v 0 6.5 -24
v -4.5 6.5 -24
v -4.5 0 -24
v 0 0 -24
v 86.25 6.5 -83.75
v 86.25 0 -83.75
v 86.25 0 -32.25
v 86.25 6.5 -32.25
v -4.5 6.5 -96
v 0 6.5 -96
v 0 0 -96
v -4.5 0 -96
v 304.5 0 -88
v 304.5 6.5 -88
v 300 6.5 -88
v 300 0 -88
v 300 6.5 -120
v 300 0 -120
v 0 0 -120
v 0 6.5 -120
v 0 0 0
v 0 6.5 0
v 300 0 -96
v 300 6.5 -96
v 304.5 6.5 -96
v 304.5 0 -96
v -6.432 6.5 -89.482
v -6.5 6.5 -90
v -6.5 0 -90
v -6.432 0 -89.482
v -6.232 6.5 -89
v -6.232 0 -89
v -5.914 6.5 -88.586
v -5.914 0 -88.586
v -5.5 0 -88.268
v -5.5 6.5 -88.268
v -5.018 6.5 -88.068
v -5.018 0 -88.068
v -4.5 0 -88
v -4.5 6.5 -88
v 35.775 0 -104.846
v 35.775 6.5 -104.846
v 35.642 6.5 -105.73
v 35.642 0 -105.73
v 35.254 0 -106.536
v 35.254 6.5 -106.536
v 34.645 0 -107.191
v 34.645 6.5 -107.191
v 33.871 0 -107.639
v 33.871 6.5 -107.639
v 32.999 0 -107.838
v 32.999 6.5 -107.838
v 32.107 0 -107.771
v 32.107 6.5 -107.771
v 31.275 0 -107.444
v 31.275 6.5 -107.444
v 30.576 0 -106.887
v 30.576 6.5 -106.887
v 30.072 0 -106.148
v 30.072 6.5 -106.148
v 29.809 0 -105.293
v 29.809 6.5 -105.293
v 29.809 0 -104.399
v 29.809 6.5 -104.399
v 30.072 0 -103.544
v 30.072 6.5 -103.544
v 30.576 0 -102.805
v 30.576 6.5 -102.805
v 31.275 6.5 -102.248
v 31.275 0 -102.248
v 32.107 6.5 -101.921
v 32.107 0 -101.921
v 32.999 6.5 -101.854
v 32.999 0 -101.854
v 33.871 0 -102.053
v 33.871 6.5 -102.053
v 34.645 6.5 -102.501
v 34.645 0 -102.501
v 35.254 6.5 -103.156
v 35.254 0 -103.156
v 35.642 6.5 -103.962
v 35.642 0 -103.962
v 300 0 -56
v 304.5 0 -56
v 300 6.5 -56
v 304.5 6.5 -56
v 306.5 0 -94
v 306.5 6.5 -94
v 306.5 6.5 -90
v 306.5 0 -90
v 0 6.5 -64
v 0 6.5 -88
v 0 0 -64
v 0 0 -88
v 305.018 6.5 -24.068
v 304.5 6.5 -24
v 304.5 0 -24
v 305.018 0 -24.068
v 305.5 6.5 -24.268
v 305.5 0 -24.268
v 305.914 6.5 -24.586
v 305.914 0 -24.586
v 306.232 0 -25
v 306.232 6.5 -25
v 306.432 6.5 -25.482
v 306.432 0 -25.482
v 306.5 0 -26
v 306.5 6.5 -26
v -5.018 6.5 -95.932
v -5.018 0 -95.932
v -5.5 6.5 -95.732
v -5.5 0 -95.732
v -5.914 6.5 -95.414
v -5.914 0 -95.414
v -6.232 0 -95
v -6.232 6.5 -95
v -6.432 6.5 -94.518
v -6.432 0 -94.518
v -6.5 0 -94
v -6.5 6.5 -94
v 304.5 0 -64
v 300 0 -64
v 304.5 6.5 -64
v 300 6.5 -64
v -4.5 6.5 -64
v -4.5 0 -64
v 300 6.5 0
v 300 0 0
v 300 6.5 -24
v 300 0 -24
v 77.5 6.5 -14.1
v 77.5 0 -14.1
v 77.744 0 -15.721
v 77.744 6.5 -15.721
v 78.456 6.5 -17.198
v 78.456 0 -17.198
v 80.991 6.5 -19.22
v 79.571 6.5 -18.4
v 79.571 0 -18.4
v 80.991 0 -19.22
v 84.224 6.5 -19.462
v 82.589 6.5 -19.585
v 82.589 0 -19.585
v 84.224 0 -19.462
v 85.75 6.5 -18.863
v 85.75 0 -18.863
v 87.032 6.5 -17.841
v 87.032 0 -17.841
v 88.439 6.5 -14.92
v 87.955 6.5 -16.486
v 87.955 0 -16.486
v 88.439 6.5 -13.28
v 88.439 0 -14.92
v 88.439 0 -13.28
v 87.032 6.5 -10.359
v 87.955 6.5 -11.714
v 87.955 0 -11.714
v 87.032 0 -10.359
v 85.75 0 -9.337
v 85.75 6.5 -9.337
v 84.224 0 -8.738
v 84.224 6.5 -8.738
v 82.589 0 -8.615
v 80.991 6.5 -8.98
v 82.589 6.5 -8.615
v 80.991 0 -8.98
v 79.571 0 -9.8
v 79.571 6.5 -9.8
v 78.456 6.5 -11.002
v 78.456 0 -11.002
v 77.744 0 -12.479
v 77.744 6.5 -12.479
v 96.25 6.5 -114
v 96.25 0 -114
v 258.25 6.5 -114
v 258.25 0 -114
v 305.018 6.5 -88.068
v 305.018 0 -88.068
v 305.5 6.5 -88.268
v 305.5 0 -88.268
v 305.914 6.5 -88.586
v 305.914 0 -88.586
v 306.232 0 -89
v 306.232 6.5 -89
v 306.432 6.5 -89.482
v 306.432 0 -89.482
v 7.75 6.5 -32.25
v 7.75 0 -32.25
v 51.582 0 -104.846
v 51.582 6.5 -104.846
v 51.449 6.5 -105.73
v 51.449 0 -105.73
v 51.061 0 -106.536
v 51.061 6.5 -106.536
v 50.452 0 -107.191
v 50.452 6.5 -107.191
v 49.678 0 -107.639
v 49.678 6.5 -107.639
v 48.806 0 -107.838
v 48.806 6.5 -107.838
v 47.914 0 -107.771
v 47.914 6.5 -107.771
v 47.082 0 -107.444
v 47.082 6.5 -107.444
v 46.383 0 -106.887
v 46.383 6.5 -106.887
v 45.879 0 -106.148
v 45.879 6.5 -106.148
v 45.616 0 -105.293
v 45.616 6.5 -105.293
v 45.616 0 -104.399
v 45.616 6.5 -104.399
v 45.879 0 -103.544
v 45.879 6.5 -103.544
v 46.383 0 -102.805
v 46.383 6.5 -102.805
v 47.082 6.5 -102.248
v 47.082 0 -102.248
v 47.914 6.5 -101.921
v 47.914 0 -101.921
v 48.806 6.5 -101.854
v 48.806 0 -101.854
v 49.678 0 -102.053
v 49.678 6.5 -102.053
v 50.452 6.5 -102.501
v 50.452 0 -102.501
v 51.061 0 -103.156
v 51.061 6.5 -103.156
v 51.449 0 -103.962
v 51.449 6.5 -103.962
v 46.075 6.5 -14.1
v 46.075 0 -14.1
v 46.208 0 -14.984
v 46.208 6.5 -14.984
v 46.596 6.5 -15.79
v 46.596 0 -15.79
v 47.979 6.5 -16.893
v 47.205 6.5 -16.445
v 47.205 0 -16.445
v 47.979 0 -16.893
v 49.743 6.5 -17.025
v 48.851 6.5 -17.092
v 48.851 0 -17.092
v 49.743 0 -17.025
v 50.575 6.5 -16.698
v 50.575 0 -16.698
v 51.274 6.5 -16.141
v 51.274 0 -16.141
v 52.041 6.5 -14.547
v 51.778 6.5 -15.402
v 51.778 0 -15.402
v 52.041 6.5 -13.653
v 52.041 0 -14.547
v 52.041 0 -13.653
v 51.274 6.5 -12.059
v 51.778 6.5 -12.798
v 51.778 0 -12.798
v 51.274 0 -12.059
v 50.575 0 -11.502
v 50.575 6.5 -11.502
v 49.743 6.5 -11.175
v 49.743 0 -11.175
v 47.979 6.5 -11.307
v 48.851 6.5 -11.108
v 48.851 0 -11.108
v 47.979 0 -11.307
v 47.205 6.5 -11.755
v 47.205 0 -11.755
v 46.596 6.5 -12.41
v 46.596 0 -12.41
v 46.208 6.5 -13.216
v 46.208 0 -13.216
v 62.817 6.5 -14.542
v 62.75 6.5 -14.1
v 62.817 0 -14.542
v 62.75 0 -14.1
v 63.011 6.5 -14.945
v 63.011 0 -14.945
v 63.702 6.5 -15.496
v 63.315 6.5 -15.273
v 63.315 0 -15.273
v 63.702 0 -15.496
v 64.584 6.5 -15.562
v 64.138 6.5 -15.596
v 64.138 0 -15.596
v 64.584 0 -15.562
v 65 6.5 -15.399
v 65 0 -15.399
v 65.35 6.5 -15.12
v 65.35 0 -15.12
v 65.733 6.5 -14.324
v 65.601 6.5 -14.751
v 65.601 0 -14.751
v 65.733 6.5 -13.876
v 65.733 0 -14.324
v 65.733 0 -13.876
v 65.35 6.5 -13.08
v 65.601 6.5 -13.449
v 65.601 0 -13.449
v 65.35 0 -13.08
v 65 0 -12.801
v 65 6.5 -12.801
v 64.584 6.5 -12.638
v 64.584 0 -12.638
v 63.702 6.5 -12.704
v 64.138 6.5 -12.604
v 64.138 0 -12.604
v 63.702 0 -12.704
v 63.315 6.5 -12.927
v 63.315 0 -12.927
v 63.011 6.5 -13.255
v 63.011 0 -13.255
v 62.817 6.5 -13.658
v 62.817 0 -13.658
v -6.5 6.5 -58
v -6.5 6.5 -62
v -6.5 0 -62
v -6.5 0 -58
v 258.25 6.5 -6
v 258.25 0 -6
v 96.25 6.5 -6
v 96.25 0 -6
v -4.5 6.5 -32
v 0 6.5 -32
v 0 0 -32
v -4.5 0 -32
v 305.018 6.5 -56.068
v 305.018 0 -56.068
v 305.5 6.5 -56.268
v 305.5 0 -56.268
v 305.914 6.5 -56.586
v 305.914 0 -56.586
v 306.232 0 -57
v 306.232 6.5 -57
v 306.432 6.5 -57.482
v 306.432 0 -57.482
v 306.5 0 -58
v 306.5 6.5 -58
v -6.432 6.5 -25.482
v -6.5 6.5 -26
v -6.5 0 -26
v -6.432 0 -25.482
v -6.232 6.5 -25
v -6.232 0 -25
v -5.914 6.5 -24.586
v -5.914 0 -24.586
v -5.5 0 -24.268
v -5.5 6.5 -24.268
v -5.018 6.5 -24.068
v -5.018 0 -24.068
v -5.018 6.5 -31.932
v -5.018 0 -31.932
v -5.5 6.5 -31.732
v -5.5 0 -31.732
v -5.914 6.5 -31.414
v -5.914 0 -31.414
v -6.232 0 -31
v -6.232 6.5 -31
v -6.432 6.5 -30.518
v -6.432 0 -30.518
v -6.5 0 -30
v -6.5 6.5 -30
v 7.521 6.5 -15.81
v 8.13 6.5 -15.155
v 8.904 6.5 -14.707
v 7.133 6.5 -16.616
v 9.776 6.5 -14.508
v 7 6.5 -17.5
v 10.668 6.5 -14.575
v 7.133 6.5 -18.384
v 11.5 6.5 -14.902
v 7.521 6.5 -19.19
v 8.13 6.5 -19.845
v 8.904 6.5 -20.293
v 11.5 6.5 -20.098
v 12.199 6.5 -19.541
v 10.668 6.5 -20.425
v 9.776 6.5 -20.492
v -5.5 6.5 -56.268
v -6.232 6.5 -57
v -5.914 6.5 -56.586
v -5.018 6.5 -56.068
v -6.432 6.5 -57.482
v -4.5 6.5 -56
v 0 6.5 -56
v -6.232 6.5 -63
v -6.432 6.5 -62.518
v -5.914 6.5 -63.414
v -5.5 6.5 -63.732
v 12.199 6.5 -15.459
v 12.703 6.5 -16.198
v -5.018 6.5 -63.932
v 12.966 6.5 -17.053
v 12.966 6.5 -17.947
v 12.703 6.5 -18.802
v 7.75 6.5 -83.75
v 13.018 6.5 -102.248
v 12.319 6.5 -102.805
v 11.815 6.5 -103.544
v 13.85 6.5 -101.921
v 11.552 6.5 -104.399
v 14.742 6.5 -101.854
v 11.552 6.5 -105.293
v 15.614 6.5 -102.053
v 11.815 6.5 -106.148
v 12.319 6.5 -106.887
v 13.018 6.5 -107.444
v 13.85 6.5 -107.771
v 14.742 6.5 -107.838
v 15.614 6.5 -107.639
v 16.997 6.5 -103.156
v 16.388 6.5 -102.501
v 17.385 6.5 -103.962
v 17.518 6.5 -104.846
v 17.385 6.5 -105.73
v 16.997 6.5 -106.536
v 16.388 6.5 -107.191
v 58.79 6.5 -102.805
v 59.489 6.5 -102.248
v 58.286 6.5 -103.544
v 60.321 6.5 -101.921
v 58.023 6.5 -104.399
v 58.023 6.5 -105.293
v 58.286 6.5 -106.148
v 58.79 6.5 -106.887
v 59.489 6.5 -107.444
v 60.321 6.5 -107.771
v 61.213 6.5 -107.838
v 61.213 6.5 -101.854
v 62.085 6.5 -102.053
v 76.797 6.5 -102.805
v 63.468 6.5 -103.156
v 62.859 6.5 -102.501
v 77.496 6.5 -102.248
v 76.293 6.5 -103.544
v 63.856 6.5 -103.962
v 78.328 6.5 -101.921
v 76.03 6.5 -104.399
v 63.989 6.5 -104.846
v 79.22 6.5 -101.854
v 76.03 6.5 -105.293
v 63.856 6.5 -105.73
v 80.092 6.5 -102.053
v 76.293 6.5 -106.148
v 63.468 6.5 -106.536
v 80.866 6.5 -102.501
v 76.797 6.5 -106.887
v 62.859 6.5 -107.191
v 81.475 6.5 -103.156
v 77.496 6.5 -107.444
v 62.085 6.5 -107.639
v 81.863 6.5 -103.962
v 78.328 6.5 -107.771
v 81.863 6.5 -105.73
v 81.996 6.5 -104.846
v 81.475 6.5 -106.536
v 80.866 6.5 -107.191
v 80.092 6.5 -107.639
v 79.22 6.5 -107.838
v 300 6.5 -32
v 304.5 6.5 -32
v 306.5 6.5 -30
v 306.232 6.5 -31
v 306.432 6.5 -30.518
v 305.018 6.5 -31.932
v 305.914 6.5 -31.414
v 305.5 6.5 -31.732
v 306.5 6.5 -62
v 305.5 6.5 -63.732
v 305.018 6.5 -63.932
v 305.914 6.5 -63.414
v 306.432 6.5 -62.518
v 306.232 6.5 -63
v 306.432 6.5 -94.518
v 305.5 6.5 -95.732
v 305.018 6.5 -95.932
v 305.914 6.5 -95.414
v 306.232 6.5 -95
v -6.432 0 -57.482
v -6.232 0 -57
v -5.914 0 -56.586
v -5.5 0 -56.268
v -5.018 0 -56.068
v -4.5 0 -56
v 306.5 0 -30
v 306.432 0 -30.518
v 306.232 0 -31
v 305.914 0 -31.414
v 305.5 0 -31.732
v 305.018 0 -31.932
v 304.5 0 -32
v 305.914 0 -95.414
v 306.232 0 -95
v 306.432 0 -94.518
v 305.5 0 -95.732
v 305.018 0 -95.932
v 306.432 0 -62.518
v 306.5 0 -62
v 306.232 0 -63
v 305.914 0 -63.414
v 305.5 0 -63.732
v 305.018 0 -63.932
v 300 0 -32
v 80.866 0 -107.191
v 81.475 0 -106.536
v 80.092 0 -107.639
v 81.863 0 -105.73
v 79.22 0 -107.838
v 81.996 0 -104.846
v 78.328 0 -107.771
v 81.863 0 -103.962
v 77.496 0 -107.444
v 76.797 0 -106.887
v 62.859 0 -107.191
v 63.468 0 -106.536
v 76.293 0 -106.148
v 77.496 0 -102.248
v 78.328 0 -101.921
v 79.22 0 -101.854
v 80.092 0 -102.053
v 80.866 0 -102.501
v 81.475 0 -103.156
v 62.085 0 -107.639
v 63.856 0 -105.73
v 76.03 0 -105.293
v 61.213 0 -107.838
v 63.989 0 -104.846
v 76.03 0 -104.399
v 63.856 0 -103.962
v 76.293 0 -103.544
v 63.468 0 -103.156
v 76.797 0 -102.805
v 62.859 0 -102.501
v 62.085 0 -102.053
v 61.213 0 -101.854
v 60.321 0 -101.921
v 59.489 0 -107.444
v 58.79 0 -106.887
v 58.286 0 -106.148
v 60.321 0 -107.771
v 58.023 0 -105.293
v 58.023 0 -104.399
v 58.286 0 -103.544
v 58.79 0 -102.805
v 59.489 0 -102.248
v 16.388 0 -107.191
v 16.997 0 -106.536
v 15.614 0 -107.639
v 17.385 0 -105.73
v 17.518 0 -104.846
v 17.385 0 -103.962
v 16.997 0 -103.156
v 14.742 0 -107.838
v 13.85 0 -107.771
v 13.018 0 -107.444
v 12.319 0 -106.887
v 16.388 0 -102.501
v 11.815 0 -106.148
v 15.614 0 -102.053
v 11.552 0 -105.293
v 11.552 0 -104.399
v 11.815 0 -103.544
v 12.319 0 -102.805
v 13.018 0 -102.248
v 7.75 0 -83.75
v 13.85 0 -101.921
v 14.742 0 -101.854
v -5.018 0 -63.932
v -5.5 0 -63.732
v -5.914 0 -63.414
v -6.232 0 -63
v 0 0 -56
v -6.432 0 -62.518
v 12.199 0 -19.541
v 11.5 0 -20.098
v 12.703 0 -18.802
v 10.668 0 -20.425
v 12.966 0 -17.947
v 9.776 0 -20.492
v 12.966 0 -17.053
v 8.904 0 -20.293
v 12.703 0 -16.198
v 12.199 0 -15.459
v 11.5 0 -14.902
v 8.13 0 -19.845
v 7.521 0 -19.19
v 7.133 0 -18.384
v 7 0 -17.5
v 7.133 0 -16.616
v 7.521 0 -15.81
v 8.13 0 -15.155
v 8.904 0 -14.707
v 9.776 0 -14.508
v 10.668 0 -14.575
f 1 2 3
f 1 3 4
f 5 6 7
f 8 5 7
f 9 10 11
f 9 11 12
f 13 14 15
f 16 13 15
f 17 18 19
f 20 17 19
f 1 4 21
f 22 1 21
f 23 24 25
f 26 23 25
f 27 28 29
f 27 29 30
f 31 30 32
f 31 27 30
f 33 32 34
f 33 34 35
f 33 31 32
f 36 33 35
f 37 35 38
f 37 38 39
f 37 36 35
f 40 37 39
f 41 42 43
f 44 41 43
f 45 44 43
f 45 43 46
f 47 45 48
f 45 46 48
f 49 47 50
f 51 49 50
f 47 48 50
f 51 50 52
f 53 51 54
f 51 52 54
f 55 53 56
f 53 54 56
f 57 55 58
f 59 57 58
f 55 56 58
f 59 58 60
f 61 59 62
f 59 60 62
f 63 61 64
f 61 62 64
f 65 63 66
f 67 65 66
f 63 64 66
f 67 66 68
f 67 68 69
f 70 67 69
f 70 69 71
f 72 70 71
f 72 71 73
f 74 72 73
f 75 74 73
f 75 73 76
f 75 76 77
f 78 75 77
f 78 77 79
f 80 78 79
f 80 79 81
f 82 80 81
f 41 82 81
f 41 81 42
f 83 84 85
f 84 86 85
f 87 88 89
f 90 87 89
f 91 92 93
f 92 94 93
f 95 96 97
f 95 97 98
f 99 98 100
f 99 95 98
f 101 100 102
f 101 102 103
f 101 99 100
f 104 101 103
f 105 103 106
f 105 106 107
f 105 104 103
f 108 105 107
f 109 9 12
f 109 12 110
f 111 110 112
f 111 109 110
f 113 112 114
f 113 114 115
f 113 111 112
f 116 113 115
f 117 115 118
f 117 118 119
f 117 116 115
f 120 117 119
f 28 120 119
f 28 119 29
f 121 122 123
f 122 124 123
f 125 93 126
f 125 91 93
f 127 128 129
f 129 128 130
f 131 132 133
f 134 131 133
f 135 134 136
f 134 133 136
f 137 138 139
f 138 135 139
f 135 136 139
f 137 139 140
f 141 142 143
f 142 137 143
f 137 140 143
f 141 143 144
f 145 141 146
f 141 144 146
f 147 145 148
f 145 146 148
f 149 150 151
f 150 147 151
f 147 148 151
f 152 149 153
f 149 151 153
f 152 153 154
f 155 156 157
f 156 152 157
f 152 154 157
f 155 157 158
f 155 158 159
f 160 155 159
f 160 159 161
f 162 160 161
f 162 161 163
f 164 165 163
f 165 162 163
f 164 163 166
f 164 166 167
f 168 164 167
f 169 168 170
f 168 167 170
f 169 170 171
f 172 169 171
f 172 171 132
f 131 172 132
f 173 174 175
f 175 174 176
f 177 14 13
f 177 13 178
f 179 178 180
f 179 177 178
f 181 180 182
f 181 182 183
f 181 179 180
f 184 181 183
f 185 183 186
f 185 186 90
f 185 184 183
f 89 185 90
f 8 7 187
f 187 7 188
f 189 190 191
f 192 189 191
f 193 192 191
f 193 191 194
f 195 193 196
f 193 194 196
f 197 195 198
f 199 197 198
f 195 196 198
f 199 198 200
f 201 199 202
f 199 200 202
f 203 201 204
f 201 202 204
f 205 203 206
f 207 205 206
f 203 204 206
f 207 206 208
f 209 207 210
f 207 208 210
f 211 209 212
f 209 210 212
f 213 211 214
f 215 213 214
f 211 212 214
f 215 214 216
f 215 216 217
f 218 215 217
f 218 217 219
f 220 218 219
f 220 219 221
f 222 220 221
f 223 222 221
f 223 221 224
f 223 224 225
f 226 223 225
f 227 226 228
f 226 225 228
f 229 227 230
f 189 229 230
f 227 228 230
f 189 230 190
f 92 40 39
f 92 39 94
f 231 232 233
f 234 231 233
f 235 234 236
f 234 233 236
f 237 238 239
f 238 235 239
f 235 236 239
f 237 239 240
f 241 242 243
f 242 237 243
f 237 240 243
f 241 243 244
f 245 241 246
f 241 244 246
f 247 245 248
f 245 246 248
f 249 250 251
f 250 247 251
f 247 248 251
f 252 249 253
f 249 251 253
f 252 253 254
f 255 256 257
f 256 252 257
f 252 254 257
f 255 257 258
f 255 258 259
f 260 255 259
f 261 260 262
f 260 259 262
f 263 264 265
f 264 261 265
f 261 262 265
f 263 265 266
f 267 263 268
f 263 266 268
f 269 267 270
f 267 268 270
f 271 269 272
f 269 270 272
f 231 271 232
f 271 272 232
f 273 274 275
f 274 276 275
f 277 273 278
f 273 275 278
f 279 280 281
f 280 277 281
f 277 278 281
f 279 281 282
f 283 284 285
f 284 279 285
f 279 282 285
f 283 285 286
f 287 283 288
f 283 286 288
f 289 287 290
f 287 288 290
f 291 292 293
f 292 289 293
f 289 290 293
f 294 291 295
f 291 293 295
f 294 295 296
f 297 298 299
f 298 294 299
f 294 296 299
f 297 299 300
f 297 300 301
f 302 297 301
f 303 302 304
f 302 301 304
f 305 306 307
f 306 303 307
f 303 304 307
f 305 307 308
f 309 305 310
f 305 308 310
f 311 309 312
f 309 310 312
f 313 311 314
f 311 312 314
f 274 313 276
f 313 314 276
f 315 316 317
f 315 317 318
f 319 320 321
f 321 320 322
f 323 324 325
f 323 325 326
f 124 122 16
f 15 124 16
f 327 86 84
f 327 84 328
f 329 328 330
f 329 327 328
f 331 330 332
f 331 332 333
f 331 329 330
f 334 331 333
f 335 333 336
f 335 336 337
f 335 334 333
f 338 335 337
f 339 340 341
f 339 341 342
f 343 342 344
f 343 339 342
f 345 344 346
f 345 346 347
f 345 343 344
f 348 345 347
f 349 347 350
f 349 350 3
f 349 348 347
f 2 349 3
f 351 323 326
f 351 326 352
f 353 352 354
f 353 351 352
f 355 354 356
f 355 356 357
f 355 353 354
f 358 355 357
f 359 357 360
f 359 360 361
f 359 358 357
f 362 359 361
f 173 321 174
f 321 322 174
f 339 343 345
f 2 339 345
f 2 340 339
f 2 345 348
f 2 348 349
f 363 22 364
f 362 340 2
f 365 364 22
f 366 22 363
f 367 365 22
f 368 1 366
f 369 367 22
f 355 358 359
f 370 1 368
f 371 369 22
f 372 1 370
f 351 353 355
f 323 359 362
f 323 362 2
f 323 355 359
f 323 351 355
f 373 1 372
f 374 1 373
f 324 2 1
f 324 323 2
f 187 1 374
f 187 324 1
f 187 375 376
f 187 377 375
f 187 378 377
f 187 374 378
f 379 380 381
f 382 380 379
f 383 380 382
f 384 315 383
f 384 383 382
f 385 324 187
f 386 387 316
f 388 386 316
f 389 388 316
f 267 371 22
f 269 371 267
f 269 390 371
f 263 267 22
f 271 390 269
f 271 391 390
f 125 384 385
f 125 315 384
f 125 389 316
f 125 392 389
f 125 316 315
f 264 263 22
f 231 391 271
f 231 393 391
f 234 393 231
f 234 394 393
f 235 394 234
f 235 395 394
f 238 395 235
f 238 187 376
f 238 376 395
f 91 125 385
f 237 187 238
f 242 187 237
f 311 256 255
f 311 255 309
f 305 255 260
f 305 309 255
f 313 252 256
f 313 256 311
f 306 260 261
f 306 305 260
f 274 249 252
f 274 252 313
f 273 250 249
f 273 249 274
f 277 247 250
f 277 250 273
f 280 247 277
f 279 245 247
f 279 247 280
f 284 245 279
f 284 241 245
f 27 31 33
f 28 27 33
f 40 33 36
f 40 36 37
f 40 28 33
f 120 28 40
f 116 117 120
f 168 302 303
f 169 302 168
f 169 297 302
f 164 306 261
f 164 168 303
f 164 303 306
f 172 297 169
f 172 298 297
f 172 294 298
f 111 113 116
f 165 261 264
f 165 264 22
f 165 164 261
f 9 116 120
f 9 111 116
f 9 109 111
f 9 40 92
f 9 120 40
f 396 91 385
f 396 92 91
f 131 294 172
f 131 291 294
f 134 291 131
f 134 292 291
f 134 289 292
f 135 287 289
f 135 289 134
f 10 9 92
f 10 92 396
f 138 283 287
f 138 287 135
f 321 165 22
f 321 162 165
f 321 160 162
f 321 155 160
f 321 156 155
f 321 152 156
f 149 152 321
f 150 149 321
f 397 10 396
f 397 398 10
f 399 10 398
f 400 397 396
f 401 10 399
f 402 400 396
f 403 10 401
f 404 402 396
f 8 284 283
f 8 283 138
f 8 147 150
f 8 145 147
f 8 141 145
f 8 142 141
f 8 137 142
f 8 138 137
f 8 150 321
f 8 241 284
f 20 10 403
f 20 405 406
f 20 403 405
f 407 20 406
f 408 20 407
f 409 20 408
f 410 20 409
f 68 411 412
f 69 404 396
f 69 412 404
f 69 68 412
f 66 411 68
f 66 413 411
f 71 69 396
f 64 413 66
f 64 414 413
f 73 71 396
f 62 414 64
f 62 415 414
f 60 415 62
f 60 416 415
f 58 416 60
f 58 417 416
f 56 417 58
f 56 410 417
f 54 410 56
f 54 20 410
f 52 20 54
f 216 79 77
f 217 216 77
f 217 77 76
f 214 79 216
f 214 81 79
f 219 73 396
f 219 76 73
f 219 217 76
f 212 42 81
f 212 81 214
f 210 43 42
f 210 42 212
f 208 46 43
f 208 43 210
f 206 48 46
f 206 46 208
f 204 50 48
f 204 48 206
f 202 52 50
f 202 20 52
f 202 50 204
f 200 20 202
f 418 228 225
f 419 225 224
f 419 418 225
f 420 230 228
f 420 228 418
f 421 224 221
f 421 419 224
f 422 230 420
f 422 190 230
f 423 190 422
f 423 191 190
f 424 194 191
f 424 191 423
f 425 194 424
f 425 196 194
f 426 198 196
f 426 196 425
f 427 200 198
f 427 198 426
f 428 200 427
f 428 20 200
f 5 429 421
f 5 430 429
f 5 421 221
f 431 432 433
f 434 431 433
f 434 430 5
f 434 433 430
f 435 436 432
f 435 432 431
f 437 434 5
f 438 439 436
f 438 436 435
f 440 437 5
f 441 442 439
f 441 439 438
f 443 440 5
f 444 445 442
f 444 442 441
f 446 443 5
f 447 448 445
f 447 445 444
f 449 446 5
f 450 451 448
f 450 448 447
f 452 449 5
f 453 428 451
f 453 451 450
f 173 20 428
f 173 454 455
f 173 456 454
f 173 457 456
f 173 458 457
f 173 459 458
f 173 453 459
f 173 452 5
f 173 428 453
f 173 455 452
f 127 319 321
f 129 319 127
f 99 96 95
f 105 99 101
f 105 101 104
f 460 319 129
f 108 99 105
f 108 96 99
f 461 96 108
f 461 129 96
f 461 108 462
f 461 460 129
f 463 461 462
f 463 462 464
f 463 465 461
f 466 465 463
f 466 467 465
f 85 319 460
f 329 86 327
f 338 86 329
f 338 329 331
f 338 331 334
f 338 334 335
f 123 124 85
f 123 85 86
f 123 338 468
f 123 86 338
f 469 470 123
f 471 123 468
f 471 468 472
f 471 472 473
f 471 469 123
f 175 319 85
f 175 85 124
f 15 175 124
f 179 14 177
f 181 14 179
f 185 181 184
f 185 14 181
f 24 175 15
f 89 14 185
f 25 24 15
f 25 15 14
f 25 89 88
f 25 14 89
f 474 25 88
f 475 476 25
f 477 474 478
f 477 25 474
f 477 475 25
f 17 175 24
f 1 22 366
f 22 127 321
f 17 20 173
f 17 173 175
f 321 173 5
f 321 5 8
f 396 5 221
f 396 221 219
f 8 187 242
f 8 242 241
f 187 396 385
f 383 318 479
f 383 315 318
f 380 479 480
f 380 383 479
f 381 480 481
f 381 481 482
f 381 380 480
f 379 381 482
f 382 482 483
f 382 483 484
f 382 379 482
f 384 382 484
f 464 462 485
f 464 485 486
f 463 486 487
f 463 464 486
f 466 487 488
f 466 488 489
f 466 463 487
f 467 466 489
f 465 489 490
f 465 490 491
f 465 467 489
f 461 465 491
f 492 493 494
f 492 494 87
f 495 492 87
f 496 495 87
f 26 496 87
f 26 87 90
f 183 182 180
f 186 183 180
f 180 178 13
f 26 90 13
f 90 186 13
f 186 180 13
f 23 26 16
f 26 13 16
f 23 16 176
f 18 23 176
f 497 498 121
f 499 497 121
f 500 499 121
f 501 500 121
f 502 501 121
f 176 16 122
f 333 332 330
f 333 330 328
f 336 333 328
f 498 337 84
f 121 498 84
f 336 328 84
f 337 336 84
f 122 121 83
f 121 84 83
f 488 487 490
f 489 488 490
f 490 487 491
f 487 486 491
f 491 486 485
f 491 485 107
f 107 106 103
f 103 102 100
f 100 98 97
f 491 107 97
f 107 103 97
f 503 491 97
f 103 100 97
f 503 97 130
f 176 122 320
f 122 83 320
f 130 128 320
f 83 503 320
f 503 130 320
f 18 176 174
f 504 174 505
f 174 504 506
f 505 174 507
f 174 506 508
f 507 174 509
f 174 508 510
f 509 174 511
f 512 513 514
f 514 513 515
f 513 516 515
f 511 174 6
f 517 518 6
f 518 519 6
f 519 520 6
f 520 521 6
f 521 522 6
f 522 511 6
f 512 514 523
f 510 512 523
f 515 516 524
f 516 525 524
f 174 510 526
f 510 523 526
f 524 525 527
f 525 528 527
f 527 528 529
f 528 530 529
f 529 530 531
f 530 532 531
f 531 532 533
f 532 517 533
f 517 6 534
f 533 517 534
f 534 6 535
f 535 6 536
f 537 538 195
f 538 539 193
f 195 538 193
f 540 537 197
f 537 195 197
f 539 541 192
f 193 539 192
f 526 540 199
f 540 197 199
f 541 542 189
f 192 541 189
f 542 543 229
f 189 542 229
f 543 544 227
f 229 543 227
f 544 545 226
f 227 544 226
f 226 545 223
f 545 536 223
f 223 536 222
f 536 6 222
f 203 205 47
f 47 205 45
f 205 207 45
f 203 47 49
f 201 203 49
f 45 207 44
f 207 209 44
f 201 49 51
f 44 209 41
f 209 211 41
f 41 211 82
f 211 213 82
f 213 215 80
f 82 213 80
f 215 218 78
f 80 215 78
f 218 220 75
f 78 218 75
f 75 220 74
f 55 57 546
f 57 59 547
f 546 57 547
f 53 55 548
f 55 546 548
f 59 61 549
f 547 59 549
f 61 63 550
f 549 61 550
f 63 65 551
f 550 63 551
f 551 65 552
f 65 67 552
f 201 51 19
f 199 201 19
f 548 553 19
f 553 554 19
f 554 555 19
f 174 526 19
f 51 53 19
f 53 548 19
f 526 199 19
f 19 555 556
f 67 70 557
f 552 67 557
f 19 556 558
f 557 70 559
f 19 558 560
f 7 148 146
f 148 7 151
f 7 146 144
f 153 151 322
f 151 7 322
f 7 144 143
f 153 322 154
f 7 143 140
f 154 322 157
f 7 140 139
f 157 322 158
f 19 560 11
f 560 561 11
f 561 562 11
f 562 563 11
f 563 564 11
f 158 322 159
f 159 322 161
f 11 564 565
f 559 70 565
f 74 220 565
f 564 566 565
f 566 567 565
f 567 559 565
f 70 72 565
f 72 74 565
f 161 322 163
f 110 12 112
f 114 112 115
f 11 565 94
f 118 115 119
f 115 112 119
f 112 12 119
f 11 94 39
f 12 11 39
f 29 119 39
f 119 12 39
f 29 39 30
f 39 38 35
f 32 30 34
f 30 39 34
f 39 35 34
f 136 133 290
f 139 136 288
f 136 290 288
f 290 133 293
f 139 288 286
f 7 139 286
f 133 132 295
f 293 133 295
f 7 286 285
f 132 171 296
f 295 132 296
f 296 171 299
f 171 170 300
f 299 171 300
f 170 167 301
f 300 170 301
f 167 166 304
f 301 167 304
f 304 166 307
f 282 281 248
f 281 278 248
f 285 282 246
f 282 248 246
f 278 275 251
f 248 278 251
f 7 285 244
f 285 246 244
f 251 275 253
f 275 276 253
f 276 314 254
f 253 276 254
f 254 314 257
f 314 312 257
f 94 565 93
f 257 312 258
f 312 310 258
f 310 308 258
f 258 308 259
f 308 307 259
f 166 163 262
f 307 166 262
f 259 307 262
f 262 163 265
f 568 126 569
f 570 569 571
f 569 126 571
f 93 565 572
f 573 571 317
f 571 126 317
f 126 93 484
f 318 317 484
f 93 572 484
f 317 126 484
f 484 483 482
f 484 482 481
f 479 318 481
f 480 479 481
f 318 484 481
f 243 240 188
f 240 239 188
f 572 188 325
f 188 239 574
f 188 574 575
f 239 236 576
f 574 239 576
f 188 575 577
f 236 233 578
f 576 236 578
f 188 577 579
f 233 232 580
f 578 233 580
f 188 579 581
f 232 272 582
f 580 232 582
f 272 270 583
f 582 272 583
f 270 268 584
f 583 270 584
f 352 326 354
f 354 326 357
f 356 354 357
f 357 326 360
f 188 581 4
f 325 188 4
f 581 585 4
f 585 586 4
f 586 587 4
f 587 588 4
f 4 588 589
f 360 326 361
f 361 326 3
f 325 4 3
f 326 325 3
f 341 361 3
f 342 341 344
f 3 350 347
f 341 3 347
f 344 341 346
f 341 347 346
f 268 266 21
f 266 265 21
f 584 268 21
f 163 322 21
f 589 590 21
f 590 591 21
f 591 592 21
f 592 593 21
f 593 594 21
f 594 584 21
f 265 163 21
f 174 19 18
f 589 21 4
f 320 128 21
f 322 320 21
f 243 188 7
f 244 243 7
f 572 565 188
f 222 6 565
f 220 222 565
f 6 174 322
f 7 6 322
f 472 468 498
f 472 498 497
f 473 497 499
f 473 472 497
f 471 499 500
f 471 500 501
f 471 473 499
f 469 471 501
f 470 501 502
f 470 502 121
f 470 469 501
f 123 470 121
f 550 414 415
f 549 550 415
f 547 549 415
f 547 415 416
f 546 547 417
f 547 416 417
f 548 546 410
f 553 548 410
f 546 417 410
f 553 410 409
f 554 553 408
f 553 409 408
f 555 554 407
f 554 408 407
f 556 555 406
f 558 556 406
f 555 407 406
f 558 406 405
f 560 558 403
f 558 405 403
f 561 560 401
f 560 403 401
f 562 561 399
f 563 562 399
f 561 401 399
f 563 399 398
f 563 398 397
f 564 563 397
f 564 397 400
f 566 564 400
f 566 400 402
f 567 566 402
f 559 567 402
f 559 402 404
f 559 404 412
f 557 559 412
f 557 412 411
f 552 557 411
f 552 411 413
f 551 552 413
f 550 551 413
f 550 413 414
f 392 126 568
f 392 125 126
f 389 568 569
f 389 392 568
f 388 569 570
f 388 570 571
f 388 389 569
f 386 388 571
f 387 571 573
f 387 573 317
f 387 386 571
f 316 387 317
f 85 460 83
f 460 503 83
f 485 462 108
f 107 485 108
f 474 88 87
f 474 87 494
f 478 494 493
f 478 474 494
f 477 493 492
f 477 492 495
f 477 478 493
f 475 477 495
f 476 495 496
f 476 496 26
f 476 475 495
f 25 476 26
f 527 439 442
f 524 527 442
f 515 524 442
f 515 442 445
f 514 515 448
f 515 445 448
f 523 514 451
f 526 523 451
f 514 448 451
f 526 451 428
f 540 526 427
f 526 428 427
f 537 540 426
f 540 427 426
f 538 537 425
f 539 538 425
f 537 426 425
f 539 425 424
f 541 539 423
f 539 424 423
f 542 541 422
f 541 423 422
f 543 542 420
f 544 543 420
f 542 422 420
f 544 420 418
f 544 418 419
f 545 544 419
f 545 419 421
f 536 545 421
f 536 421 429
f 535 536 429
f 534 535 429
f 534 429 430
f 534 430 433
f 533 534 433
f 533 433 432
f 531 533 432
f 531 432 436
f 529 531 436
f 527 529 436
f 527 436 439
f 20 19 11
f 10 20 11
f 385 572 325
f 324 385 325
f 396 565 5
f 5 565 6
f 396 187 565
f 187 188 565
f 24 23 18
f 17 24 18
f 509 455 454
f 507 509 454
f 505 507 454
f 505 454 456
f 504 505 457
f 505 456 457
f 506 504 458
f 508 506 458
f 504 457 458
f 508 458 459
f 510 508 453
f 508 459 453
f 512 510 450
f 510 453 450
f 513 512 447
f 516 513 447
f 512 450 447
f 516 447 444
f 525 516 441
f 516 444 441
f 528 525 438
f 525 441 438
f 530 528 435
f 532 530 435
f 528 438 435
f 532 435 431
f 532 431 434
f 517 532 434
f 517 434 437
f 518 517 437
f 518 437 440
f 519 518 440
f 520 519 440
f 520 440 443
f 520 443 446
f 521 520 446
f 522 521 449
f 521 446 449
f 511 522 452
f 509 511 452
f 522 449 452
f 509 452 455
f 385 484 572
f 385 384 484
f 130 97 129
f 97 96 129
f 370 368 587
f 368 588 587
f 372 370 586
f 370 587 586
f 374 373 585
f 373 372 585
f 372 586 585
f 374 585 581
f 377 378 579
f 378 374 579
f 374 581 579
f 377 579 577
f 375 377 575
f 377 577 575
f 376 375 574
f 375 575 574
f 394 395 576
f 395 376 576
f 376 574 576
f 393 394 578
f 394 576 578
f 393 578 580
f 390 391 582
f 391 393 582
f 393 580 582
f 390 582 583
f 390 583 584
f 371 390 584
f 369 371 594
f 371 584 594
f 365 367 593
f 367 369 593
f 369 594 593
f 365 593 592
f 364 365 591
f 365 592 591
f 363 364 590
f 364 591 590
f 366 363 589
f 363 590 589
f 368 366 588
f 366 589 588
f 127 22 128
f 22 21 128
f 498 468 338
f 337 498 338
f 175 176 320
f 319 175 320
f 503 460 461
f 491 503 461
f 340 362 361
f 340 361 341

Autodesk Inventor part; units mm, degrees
ref_plane "YZ Plane" through (0, 0, 0) normal (1, 0, 0) x (0, 1, 0)
ref_plane "XZ Plane" through (0, 0, 0) normal (0, 1, 0) x (-1, 0, 0)
ref_plane "XY Plane" through (0, 0, 0) normal (0, 0, 1) x (1, 0, 0)
sketch "Sketch1" plane through (0, 0, 0) normal (0, 1, 0) x (-1, 0, 0)
  line L0 (0, 0) -> (-300, 0)
  line L1 (-300, 0) -> (-300, -120)
  line L2 (-300, -120) -> (0, -120)
  line L3 (0, -120) -> (0, 0)
  line L4 (-96.25, -114) -> (-258.25, -114)
  line L5 (-258.25, -114) -> (-258.25, -6)
  line L6 (-258.25, -6) -> (-96.25, -6)
  line L7 (-96.25, -6) -> (-96.25, -114)
  circle A0 centre (-10, -17.5) radius 3
  circle A1 centre (-49.075, -14.1) radius 3
  circle A2 centre (-64.25, -14.1) radius 1.5
  circle A3 centre (-83, -14.1) radius 5.5
  circle A4 centre (-64.25, -14.1) radius 5.85 construction
  line L8 (-46.075, -17.1) -> (-52.075, -17.1) construction
  line L9 (-52.075, -17.1) -> (-52.075, -11.1) construction
  line L10 (-52.075, -11.1) -> (-46.075, -11.1) construction
  line L11 (-46.075, -11.1) -> (-46.075, -17.1) construction
  line L12 (-76.25, -20.1) -> (-89.75, -20.1) construction
  line L13 (-89.75, -20.1) -> (-89.75, -8.1) construction
  line L14 (-89.75, -8.1) -> (-76.25, -8.1) construction
  line L15 (-76.25, -8.1) -> (-76.25, -20.1) construction
  line L16 (-7.75, -83.75) -> (-86.25, -83.75)
  line L17 (-86.25, -83.75) -> (-86.25, -32.25)
  line L18 (-86.25, -32.25) -> (-7.75, -32.25)
  line L19 (-7.75, -32.25) -> (-7.75, -83.75)
  line L20 (-8, -83.5) -> (-86, -83.5) construction
  line L21 (-86, -83.5) -> (-86, -32.5) construction
  line L22 (-86, -32.5) -> (-8, -32.5) construction
  line L23 (-8, -32.5) -> (-8, -83.5) construction
  line L24 (-0.5, -93) -> (-93.5, -93) construction
  line L25 (-93.5, -93) -> (-93.5, -6) construction
  line L26 (-93.5, -6) -> (-0.5, -6) construction
  line L27 (-0.5, -6) -> (-0.5, -93) construction
  point P0 (-49.075, -17.1)
  point P1 (-52.075, -14.1)
  point P2 (-83, -20.1)
  point P3 (-89.75, -14.1)
  point P4 (-47, -83.5)
  point P5 (-47, -83.75)
  point P6 (-86, -58)
  point P7 (-86.25, -58)
  dimension "d0" = 300
  dimension "d1" = 6
  dimension "d4" = 3
  dimension "d5" = 11
  dimension "d6" = 6
  dimension "d7" = 18.75
  dimension "d8" = 15.175
  dimension "d9" = 11.7
  dimension "d10" = 6
  dimension "d11" = 13.5
  dimension "d12" = 12
  dimension "d15" = 162
  dimension "d16" = 108
  dimension "d18" = 6
  dimension "d19" = 6
  dimension "d20" = 78.5
  dimension "d21" = 51.5
  dimension "d22" = 78
  dimension "d23" = 51
  dimension "d24" = 18.4
  dimension "d25" = 7.5
  dimension "d27" = 87
  dimension "d28" = 9.5
  dimension "d29" = 10
  dimension "d30" = 0.5
  dimension "d33" = 6
  dimension "d34" = 15
  dimension "d35" = 9.5
  dimension "d36" = 10.5
  dimension "d37" = 93
extrude "Extrusion1" add sketch "Sketch1" along normal blind 6.5
sketch "Sketch2" plane through (0, 6.5, 0) normal (0, 1, 0) x (1, 0, 0)
  line L0 (7.75, 83.75) -> (86.25, 83.75) projected
  circle A0 centre (14.518, 104.846) radius 3
  circle A1 centre (32.775, 104.846) radius 3
  circle A2 centre (60.989, 104.846) radius 3
  circle A3 centre (78.996, 104.846) radius 3
  circle A4 centre (48.582, 104.846) radius 3
  circle A5 centre (80.796, 97.346) radius 1.5
  line L1 (9, 109.85) -> (85, 109.85) construction
  line L2 (85, 109.85) -> (85, 93.75) construction
  line L3 (85, 93.75) -> (9, 93.75) construction
  line L4 (9, 93.75) -> (9, 109.85) construction
  point P0 (47, 83.75)
  point P1 (47, 93.75)
  dimension "d38" = 6
  dimension "d39" = 18.257
  dimension "d40" = 15.807
  dimension "d41" = 12.407
  dimension "d42" = 18.007
  dimension "d43" = 3
  dimension "d44" = 1.8
  dimension "d45" = 7.5
  dimension "d46" = 76
  dimension "d47" = 16.1
  dimension "d48" = 5.004
  dimension "d49" = 5.518
  dimension "d50" = 10
extrude "Extrusion2" cut sketch "Sketch2" against normal through all
sketch "Sketch3" plane through (0, 6.5, 0) normal (0, 1, 0) x (1, 0, 0)
  line L0 (0, 0) -> (300, 0) projected
  line L1 (300, 120) -> (0, 120) projected
  line L2 (0, 120) -> (0, 0) projected
  line L3 (0, 96) -> (-4.5, 96)
  line L4 (-6.5, 94) -> (-6.5, 90)
  line L5 (-4.5, 88) -> (0, 88)
  line L6 (0, 88) -> (0, 96)
  line L7 (0, 64) -> (-4.5, 64)
  line L8 (-6.5, 62) -> (-6.5, 58)
  line L9 (-4.5, 56) -> (0, 56)
  line L10 (0, 56) -> (0, 64)
  line L11 (0, 32) -> (-4.5, 32)
  line L12 (-6.5, 30) -> (-6.5, 26)
  line L13 (-4.5, 24) -> (0, 24)
  line L14 (0, 24) -> (0, 32)
  line L15 (150, 120) -> (150, 0) construction
  arc A0 (-4.5, 96) -> (-6.5, 94) centre (-4.5, 94) ccw
  arc A1 (-6.5, 90) -> (-4.5, 88) centre (-4.5, 90) ccw
  arc A2 (-4.5, 64) -> (-6.5, 62) centre (-4.5, 62) ccw
  arc A3 (-6.5, 58) -> (-4.5, 56) centre (-4.5, 58) ccw
  arc A4 (-4.5, 32) -> (-6.5, 30) centre (-4.5, 30) ccw
  arc A5 (-6.5, 26) -> (-4.5, 24) centre (-4.5, 26) ccw
  line L16 (-2.25, 96) -> (-2.25, 120) construction
  line L17 (-2.25, 88) -> (-2.25, 64) construction
  line L18 (-2.25, 56) -> (-2.25, 32) construction
  line L19 (-2.25, 24) -> (-2.25, 0) construction
  line L20 (300, 96) -> (304.5, 96)
  line L21 (306.5, 94) -> (306.5, 90)
  line L22 (304.5, 88) -> (300, 88)
  line L23 (300, 88) -> (300, 96)
  line L24 (300, 64) -> (304.5, 64)
  line L25 (306.5, 62) -> (306.5, 58)
  line L26 (304.5, 56) -> (300, 56)
  line L27 (300, 56) -> (300, 64)
  line L28 (300, 32) -> (304.5, 32)
  line L29 (306.5, 30) -> (306.5, 26)
  line L30 (304.5, 24) -> (300, 24)
  line L31 (300, 24) -> (300, 32)
  arc A6 (306.5, 94) -> (304.5, 96) centre (304.5, 94) ccw
  arc A7 (304.5, 88) -> (306.5, 90) centre (304.5, 90) ccw
  arc A8 (306.5, 62) -> (304.5, 64) centre (304.5, 62) ccw
  arc A9 (304.5, 56) -> (306.5, 58) centre (304.5, 58) ccw
  arc A10 (306.5, 30) -> (304.5, 32) centre (304.5, 30) ccw
  arc A11 (304.5, 24) -> (306.5, 26) centre (304.5, 26) ccw
  point P0 (302.25, 96)
  point P1 (302.25, 88)
  point P2 (302.25, 64)
  point P3 (302.25, 56)
  point P4 (302.25, 32)
  point P5 (302.25, 24)
  dimension "d53" = 2
  dimension "d54" = 8
  dimension "d55" = 8
  dimension "d56" = 8
  dimension "d57" = 6.5
extrude "Extrusion3" add sketch "Sketch3" against normal blind 6.5
sketch "Sketch4" plane through (0, 6.5, 0) normal (0, 1, 0) x (1, 0, 0)
  circle A0 centre (80.796, 97.346) radius 1.5 projected
extrude "Extrusion4" add sketch "Sketch4" against normal blind 6.5
properties part number "main_lcd_front_2" material "Plywood, Finish"
